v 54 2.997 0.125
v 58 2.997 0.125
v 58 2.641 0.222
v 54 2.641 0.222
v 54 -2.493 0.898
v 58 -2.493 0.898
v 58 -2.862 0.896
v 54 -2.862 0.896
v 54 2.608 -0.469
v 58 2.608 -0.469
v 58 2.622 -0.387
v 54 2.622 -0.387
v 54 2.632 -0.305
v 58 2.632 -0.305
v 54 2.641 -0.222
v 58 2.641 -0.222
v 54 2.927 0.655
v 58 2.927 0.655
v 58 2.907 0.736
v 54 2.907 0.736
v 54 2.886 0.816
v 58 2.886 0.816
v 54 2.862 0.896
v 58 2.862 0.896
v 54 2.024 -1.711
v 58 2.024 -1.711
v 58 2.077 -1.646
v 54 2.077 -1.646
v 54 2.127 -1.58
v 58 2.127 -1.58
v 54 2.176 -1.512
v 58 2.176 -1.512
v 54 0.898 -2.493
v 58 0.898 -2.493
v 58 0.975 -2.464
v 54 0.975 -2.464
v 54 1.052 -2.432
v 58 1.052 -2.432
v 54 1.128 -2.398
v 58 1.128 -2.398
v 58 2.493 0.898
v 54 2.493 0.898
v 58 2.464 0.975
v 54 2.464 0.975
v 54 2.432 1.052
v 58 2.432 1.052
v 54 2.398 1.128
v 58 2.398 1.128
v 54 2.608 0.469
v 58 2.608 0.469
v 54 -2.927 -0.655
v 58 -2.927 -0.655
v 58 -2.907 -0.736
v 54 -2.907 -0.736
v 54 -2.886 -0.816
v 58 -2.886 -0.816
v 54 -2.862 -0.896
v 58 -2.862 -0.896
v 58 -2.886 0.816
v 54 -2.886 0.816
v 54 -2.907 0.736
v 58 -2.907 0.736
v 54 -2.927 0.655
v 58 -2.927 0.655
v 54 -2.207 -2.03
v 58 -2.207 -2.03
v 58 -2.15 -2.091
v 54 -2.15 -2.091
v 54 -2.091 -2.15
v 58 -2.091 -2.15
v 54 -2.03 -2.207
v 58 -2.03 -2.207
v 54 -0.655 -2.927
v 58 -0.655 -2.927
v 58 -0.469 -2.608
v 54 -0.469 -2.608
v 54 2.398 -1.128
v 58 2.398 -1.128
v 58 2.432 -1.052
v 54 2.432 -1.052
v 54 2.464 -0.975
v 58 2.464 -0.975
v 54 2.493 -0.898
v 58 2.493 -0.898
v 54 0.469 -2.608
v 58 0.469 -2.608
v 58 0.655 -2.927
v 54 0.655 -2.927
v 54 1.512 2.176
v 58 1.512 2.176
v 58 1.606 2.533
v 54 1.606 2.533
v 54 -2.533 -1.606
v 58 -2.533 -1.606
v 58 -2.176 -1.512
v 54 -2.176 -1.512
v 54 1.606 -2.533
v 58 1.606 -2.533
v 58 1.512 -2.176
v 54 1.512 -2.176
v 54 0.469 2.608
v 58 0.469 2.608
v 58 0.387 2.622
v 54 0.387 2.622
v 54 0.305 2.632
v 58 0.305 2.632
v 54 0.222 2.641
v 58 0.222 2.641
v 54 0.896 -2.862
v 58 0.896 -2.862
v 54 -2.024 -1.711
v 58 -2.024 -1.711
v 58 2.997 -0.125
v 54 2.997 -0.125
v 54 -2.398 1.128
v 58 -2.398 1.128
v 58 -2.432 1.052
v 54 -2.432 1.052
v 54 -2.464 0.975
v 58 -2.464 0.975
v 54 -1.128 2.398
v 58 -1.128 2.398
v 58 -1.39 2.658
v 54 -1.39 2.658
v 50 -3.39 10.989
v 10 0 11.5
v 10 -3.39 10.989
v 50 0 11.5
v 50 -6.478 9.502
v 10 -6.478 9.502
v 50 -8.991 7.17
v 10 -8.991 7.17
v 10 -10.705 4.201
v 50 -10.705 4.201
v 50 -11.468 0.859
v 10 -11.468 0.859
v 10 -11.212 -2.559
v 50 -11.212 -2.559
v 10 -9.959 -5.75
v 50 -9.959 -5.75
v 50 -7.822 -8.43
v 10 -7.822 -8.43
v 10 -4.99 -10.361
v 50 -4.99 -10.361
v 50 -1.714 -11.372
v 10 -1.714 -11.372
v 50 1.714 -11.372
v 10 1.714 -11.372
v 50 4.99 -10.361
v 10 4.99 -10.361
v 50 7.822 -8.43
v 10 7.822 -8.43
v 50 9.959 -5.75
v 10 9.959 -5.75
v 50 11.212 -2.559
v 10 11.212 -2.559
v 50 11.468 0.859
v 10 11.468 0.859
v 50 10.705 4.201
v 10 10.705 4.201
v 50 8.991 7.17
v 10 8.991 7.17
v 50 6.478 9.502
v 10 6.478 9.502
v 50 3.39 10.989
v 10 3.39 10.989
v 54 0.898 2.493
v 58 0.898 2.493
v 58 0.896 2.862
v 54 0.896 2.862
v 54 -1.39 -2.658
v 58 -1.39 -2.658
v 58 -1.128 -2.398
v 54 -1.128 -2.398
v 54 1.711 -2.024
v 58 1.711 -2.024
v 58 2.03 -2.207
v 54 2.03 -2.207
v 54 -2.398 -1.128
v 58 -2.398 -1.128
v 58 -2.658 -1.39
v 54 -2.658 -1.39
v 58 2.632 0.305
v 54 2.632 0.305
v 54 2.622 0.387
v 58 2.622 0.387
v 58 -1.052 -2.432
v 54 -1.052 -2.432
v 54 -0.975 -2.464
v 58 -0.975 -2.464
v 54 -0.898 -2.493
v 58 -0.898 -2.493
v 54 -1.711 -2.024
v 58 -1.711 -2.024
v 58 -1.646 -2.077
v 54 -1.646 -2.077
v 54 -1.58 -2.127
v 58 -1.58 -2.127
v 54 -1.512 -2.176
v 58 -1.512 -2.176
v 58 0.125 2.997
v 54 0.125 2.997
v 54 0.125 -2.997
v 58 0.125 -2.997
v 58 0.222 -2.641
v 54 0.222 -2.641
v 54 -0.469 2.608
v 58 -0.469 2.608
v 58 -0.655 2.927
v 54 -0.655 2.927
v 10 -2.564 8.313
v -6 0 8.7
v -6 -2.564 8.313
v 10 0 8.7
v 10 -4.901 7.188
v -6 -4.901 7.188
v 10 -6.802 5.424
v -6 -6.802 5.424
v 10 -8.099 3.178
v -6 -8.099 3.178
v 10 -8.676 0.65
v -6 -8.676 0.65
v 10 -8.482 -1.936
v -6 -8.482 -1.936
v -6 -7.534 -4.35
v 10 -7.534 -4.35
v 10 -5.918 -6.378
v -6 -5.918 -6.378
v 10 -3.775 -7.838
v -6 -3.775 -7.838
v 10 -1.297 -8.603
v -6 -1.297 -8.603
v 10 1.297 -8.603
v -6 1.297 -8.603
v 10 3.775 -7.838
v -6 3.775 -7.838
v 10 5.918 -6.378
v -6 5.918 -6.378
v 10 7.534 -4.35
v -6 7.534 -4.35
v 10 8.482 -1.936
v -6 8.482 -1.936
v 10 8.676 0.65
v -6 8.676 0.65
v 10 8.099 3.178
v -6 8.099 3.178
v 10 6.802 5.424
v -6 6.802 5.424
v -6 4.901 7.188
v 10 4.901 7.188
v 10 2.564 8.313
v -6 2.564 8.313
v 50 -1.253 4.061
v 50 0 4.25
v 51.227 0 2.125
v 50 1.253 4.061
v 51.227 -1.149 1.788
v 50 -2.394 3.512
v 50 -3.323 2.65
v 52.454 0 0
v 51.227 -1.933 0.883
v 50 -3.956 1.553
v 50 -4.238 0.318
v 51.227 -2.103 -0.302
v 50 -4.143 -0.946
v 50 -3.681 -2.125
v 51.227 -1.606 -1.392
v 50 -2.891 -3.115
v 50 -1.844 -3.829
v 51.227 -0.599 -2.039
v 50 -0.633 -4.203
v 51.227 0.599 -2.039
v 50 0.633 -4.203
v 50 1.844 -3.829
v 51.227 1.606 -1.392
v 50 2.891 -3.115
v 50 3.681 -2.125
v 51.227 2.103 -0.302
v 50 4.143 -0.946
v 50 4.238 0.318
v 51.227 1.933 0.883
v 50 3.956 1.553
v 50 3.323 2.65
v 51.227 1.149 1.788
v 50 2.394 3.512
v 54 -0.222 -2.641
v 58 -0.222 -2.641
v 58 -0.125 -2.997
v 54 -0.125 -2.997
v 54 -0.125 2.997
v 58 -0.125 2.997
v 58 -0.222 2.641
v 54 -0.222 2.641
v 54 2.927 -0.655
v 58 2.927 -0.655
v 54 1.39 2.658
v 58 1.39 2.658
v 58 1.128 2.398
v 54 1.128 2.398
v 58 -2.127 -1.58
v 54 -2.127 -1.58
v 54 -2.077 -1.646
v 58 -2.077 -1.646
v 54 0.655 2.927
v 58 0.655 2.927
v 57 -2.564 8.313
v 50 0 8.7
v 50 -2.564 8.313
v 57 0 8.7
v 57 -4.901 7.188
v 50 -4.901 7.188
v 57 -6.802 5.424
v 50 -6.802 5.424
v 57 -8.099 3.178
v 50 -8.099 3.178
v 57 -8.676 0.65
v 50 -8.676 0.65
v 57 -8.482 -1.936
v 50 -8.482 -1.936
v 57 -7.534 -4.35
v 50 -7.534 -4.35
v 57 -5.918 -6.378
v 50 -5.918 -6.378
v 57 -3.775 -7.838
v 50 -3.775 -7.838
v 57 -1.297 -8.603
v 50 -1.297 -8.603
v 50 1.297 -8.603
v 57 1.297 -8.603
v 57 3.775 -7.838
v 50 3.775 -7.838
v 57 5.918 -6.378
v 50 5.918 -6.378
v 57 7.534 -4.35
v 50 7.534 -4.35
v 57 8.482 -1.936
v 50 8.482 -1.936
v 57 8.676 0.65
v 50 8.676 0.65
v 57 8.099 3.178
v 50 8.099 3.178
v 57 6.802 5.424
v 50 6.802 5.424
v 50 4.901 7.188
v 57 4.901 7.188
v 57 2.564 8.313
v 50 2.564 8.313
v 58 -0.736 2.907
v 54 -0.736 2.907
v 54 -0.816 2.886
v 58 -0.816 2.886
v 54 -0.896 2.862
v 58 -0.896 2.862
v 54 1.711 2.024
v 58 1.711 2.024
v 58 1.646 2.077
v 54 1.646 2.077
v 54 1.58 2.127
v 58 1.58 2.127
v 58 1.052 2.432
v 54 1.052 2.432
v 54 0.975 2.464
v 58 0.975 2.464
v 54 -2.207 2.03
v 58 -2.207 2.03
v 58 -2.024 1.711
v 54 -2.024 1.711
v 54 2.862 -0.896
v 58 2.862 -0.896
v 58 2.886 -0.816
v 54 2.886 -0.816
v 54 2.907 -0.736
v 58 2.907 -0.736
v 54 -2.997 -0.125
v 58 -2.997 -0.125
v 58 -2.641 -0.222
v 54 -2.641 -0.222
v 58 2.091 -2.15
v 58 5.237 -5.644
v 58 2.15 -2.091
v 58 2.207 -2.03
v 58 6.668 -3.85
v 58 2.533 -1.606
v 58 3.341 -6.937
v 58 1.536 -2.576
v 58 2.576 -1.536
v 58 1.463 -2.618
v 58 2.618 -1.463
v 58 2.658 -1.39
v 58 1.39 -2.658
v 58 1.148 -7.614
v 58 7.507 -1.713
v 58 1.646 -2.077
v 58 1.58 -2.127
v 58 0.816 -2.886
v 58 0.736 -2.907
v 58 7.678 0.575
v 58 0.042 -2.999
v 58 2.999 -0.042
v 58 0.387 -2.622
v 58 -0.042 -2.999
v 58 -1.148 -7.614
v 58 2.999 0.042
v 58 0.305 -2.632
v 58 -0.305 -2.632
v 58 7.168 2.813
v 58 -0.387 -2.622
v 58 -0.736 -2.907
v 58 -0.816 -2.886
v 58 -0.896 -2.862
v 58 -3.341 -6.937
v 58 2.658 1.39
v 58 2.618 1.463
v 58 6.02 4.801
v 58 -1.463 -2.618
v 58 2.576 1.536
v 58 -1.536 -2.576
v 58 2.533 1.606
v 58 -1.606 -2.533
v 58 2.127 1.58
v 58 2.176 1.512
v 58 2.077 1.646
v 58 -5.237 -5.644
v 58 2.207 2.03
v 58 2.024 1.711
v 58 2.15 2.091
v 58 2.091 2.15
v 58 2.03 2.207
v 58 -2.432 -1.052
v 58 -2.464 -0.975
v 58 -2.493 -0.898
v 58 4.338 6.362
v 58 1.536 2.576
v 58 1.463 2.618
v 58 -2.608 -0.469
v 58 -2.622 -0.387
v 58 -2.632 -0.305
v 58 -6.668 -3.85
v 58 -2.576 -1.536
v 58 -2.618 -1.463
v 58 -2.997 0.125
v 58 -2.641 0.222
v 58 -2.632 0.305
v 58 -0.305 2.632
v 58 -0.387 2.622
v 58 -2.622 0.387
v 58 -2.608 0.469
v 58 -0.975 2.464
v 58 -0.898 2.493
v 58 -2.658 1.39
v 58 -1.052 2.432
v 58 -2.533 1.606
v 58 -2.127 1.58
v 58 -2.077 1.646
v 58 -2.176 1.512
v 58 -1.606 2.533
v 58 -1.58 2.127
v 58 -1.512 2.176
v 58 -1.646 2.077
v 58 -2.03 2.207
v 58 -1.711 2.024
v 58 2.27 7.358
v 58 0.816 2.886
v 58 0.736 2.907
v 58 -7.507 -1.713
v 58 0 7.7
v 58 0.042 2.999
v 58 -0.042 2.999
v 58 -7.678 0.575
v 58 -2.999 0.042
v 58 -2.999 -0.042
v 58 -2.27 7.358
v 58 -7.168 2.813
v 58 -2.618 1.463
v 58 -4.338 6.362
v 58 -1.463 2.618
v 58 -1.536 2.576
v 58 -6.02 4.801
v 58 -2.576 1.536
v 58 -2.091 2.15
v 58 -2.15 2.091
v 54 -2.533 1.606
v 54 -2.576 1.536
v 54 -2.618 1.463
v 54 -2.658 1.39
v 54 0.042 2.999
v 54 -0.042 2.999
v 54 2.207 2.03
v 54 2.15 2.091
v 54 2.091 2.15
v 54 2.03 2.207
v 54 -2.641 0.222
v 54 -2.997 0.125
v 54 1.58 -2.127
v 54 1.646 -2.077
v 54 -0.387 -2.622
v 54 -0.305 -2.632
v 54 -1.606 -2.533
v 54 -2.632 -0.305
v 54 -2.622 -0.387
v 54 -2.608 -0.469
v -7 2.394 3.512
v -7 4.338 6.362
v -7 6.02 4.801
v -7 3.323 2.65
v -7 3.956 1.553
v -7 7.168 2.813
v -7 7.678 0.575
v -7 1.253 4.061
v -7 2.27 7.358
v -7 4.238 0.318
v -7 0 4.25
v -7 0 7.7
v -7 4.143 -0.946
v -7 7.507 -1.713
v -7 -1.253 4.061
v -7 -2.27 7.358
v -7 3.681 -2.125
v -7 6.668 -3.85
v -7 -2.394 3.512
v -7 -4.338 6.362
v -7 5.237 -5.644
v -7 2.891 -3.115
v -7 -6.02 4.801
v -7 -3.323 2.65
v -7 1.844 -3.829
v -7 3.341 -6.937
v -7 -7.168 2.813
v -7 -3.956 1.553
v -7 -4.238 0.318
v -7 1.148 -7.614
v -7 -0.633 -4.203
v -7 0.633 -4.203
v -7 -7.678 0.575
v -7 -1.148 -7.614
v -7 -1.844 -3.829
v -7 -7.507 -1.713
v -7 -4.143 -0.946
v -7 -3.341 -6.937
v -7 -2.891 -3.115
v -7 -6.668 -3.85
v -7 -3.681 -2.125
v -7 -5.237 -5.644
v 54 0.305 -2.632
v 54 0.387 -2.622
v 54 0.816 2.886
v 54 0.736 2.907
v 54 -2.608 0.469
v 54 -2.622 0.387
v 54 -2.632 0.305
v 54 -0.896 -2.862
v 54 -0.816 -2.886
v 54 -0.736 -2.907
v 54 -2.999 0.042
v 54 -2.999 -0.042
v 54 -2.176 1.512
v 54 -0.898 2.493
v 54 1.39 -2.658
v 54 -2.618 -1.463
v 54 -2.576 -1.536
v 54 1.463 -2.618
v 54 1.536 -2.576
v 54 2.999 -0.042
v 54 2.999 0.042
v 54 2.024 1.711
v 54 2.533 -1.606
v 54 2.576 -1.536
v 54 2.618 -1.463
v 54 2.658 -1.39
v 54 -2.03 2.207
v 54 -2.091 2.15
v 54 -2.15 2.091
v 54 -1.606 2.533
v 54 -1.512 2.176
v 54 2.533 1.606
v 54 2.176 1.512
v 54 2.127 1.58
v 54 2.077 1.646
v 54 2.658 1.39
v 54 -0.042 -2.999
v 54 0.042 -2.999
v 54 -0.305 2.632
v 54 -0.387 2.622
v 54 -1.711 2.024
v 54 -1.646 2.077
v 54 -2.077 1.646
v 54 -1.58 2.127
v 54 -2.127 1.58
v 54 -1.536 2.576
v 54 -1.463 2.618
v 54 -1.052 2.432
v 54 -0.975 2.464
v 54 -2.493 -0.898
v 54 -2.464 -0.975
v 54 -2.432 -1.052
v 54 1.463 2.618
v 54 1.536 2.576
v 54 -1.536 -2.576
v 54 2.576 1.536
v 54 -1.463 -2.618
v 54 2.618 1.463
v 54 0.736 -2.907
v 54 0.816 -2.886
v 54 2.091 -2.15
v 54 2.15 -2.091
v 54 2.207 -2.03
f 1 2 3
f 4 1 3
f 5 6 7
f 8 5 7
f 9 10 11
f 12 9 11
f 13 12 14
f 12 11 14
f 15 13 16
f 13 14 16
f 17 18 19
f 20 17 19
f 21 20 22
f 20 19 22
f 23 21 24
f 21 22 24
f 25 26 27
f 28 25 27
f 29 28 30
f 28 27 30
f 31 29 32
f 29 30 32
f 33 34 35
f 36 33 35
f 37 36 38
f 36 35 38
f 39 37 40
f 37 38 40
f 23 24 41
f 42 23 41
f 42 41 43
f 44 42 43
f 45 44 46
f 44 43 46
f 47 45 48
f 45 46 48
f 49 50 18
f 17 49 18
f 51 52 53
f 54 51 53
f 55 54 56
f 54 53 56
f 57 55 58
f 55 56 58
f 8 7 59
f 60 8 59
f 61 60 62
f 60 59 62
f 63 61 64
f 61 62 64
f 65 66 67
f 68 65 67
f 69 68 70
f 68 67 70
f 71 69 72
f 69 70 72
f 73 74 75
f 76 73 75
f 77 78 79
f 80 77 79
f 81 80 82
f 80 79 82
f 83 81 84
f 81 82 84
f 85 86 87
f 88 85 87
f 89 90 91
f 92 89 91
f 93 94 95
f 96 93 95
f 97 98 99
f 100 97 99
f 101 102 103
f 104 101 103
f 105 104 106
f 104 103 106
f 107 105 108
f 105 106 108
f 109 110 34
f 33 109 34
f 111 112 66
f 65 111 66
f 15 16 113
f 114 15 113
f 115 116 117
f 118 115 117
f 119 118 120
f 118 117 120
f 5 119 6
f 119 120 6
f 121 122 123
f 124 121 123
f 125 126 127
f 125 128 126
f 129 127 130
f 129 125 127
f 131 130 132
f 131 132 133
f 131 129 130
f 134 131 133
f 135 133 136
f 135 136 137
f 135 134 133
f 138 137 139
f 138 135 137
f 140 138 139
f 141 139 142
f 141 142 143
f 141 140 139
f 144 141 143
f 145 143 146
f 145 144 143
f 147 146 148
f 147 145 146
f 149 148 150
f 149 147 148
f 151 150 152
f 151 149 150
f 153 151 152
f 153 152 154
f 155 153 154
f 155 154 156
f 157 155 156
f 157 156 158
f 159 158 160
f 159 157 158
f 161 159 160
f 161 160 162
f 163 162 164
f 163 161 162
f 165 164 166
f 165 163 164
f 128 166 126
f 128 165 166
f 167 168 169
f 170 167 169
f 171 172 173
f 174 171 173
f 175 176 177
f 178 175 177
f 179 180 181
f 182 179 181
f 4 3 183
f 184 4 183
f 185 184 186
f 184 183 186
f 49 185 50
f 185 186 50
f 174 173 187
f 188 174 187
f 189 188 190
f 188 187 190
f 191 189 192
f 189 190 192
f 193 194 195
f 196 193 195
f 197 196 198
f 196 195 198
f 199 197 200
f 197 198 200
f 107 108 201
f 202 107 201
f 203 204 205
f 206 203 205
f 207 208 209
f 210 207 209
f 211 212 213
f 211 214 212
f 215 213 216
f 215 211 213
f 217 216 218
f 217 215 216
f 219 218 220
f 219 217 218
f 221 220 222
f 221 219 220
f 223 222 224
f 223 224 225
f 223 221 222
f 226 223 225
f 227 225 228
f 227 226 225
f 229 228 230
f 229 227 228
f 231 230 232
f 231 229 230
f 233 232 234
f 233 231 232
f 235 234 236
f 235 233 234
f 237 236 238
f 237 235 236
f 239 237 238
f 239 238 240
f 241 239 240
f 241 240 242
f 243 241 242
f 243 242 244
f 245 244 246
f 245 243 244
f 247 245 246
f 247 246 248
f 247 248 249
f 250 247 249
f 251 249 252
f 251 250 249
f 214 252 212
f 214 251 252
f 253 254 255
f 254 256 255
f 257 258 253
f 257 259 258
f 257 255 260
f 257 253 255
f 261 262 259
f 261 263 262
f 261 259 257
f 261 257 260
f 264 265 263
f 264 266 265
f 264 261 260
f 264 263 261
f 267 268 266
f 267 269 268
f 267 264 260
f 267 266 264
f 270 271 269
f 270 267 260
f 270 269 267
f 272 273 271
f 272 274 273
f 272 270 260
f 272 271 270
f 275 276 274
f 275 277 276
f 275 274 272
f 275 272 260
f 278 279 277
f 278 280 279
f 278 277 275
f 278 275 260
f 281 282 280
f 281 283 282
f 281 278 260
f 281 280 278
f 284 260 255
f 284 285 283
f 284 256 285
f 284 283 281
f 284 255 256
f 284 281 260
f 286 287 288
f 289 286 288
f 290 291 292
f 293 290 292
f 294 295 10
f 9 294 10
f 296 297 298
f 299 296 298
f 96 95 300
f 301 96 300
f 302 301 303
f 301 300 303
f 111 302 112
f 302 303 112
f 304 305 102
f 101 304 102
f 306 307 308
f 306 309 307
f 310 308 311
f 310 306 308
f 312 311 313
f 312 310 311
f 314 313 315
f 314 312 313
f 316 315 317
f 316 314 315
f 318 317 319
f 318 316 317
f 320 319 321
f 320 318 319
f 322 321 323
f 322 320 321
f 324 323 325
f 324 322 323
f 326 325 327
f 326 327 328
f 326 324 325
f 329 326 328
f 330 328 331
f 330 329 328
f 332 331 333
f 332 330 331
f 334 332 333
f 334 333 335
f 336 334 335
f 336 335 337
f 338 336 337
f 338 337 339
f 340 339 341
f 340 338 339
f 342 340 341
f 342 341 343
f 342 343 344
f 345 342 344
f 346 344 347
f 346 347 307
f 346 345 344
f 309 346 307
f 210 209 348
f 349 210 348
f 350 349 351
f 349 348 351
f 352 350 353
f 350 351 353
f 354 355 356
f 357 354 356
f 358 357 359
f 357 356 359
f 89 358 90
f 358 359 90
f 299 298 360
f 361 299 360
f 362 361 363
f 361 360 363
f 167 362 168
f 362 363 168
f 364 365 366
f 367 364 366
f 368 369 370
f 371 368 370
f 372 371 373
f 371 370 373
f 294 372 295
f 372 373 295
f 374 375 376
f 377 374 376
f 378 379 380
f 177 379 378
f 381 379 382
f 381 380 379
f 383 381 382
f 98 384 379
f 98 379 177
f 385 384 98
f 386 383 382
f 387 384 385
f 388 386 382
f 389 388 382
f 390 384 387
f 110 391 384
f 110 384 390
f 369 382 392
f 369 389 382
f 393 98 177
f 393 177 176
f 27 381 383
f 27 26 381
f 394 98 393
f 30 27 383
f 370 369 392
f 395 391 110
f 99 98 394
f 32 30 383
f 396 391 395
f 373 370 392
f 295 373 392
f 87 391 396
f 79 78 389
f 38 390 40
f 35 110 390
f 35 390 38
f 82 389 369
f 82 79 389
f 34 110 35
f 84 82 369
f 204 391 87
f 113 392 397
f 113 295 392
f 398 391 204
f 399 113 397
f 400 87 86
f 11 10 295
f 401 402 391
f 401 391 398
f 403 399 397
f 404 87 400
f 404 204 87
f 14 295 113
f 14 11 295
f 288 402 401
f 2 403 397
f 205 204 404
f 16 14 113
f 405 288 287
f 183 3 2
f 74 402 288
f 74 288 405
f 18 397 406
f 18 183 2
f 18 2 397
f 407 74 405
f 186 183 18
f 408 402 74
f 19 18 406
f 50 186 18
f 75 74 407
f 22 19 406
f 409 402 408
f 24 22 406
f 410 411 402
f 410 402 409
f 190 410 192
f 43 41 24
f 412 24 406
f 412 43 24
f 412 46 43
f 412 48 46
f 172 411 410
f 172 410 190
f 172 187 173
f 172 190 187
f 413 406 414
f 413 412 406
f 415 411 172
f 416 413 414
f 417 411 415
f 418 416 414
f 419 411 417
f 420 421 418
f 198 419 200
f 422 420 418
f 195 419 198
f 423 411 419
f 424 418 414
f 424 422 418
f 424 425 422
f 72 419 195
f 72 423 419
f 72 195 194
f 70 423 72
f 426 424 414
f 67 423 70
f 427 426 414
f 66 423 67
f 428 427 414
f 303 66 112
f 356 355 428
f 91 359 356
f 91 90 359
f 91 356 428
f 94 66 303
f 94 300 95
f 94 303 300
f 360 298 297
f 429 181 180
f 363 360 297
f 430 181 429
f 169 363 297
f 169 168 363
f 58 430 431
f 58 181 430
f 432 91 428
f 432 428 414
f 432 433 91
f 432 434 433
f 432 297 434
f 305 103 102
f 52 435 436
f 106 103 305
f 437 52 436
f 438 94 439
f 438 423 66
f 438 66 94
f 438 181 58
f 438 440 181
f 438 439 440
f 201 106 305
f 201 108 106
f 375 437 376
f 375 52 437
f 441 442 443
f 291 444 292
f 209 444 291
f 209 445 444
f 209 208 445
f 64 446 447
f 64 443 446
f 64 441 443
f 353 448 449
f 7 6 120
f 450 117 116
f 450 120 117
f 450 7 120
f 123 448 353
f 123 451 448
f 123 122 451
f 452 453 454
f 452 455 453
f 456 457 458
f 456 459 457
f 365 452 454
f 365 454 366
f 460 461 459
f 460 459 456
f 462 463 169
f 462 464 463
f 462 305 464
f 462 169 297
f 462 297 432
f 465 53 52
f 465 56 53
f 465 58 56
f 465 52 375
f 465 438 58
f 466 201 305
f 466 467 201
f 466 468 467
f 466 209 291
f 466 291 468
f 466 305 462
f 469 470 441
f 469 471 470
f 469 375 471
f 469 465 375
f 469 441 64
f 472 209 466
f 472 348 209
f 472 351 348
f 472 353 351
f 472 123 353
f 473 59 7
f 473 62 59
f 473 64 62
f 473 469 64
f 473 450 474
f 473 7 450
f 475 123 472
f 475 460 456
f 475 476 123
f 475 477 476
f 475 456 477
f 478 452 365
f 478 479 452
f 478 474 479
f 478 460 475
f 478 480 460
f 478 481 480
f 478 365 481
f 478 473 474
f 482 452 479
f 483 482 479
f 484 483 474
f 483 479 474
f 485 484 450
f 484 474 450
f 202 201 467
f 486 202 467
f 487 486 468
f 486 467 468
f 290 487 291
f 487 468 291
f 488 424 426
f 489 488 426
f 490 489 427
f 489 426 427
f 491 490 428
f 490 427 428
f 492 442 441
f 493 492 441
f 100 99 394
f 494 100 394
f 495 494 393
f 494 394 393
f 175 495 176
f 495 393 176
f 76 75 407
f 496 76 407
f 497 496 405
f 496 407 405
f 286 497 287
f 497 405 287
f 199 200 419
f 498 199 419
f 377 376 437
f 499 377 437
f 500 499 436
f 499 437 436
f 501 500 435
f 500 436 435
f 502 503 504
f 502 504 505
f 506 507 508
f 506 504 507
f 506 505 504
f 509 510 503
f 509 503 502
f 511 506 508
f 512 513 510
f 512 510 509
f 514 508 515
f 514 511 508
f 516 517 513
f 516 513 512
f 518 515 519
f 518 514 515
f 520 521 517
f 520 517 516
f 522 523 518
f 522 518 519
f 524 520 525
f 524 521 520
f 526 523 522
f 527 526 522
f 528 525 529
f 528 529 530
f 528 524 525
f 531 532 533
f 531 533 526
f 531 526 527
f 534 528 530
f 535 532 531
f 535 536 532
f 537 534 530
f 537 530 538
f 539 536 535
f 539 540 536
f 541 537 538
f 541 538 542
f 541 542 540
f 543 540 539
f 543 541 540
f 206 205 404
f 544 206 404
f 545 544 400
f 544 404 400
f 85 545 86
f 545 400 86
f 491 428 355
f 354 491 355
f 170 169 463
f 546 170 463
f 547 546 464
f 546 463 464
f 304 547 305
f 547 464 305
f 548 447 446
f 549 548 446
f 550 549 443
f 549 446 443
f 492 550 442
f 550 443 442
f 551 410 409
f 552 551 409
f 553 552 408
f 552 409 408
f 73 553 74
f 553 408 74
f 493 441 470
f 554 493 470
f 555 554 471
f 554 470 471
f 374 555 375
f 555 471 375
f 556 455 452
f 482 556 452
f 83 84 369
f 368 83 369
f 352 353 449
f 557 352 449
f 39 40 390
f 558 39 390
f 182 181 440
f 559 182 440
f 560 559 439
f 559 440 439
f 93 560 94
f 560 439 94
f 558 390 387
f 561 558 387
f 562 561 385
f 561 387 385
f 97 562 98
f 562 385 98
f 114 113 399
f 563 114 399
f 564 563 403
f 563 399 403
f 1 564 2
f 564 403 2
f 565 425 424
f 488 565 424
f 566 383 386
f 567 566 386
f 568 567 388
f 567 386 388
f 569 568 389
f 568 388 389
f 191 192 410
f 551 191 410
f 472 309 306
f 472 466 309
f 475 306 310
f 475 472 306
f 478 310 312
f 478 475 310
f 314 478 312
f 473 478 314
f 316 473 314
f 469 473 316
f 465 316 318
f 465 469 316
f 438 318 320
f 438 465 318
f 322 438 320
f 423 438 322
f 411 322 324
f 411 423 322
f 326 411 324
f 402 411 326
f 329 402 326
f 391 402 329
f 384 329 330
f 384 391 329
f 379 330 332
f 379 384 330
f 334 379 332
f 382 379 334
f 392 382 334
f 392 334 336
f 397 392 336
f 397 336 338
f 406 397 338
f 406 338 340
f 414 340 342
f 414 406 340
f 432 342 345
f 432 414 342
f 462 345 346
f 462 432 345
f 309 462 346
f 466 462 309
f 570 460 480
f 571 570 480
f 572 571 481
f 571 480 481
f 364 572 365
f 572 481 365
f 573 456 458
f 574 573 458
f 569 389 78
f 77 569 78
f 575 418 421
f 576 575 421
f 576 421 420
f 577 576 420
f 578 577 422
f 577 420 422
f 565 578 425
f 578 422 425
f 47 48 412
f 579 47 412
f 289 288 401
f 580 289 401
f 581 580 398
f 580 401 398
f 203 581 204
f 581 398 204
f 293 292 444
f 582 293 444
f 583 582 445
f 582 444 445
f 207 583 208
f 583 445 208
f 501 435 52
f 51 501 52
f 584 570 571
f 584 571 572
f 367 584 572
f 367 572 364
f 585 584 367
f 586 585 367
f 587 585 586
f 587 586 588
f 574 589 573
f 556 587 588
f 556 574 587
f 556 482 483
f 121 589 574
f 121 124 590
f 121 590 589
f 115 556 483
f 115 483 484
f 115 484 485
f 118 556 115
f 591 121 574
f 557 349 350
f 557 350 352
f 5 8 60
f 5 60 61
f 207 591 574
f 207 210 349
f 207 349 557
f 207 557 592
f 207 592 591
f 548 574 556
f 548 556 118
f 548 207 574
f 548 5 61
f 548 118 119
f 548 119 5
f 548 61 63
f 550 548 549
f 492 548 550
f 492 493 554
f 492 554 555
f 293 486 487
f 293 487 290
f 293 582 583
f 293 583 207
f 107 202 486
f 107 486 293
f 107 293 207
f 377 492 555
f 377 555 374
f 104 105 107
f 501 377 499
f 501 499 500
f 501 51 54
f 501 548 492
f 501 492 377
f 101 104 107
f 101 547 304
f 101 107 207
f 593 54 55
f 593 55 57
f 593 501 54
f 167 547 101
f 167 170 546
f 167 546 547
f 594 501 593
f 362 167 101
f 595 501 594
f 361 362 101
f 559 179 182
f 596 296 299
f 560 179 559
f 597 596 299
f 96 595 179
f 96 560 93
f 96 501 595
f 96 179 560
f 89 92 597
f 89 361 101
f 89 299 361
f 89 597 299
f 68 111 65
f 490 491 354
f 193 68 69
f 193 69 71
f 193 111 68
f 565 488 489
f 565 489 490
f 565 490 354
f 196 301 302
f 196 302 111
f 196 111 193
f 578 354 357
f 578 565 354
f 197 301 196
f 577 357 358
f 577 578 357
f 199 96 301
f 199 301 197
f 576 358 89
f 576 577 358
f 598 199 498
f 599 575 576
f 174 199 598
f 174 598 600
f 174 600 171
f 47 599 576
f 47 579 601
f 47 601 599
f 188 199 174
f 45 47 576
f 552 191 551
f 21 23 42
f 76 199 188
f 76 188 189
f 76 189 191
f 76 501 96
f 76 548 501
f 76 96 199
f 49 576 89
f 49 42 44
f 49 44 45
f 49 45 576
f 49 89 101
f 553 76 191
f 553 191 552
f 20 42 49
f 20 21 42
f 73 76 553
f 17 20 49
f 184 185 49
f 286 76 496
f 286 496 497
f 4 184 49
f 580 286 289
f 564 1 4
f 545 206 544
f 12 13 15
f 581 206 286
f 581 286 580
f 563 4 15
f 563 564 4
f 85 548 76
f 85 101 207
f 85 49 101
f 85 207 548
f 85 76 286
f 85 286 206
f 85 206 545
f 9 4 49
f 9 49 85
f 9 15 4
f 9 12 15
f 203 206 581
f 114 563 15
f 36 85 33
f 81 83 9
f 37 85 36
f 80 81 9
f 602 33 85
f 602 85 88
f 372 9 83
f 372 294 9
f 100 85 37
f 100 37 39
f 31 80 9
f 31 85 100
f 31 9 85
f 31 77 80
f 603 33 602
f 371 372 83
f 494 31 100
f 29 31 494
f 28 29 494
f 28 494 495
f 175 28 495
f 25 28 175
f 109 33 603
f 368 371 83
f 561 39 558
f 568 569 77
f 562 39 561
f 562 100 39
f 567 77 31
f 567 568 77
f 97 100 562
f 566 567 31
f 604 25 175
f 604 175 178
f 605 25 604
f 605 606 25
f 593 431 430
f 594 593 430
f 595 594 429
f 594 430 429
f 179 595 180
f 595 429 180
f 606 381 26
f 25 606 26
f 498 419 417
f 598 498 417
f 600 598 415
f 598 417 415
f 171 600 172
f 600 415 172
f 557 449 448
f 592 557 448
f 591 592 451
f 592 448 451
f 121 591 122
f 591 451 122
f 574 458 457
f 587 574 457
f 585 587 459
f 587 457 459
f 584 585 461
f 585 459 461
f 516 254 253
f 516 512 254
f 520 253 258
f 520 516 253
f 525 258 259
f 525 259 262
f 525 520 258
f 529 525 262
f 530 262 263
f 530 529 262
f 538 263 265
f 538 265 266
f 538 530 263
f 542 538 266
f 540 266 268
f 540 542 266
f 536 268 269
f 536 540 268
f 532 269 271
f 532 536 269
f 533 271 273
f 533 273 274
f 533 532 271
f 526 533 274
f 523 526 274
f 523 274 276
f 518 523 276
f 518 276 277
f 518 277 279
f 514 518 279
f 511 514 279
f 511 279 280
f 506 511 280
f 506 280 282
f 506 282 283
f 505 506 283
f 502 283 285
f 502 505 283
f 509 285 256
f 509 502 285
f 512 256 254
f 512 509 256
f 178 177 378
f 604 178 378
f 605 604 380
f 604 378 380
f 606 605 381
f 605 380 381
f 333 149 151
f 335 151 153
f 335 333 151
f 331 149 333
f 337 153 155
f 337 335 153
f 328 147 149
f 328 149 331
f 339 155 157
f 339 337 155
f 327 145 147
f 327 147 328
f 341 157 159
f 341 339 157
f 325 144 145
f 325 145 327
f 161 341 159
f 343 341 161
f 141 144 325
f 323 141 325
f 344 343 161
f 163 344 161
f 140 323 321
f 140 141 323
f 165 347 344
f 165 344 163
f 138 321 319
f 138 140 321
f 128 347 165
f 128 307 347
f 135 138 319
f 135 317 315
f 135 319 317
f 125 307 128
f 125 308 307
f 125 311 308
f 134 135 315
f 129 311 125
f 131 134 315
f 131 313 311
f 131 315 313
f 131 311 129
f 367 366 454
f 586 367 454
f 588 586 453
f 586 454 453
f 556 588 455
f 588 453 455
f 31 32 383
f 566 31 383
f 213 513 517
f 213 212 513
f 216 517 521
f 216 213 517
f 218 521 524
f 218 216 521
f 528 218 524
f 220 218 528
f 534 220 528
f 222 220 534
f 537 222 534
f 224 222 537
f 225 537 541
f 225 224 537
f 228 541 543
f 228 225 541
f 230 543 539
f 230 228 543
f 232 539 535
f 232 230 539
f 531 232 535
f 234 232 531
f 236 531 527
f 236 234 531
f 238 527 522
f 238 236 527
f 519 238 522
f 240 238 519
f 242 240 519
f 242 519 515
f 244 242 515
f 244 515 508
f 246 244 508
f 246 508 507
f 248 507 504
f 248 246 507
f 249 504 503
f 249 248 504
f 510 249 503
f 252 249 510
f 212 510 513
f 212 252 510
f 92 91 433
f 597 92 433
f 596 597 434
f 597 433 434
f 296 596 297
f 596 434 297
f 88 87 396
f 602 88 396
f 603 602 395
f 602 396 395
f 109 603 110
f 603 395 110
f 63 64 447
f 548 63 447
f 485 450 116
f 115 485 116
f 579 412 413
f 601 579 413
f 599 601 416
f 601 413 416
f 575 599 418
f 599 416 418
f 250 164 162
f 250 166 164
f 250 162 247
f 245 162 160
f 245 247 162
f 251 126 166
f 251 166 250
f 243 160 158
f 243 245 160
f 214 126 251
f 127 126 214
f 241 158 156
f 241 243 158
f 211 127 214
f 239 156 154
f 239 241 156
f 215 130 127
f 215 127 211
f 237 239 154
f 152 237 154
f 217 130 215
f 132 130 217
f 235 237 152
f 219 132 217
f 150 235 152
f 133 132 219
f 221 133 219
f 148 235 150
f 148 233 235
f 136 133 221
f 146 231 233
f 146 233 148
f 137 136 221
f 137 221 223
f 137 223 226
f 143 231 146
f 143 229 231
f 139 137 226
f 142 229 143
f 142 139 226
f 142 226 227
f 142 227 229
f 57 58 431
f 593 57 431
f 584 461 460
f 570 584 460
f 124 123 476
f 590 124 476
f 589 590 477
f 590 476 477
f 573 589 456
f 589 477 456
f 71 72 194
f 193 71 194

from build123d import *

# Parameters (mm, degrees)
CUT_EXTRUDE_1_DEPTH = 4


with BuildPart() as part:
    # Эскиз3 → Повернуть1 (revolve)
    with BuildSketch(Plane.XY, mode=Mode.PRIVATE) as revolve_1_sk:
        Polygon((-7, 4.25), (-7, 7.7), (-6, 8.7), (10, 8.7), (10, 11.5), (50, 11.5), (50, 8.7), (57, 8.7), (58, 7.7), (58, 0), (52.453738644, 0), (50, 4.25), align=None)
    revolve(revolve_1_sk.sketch.rotate(Axis((-6.877569373, 0, 0), (1, 0, 0)), 90), axis=Axis((-6.877569373, 0, 0), (1, 0, 0)))

    # Эскиз4 → Вырез-Вытянуть1 (cut)
    with BuildSketch(Plane(origin=(58, 0, -31), x_dir=(0, 0, 1), z_dir=(-1, 0, 0))):
        with BuildLine():
            Line((30.778386531, 2.640717227), (30.875027145, 2.996524002))
            ThreePointArc((30.875027145, 2.996524002), (31, 2.999128925), (31.124972855, 2.996524002))
            Line((31.124972855, 2.996524002), (31.221613469, 2.640717227))
            ThreePointArc((31.221613469, 2.640717227), (31.345894409, 2.627328883), (31.469405738, 2.608094755))
            Line((31.469405738, 2.608094755), (31.654842973, 2.926765277))
            ThreePointArc((31.654842973, 2.926765277), (31.776231684, 2.896936085), (31.896271989, 2.862074568))
            Line((31.896271989, 2.862074568), (31.897530084, 2.493379183))
            ThreePointArc((31.897530084, 2.493379183), (32.014111096, 2.448280761), (32.12843572, 2.397734937))
            Line((32.12843572, 2.397734937), (32.390032334, 2.657552336))
            ThreePointArc((32.390032334, 2.657552336), (32.499564462, 2.597321838), (32.606491668, 2.532579481))
            Line((32.606491668, 2.532579481), (32.512281507, 2.176121468))
            ThreePointArc((32.512281507, 2.176121468), (32.613217787, 2.102386352), (32.710564672, 2.023973445))
            Line((32.710564672, 2.023973445), (33.030493289, 2.207231595))
            ThreePointArc((33.030493289, 2.207231595), (33.1207044, 2.1207044), (33.207231595, 2.030493289))
            Line((33.207231595, 2.030493289), (33.023973445, 1.710564672))
            ThreePointArc((33.023973445, 1.710564672), (33.102386352, 1.613217787), (33.176121468, 1.512281507))
            Line((33.176121468, 1.512281507), (33.532579481, 1.606491668))
            ThreePointArc((33.532579481, 1.606491668), (33.597321838, 1.499564462), (33.657552336, 1.390032334))
            Line((33.657552336, 1.390032334), (33.397734937, 1.12843572))
            ThreePointArc((33.397734937, 1.12843572), (33.448280761, 1.014111096), (33.493379183, 0.897530084))
            Line((33.493379183, 0.897530084), (33.862074568, 0.896271989))
            ThreePointArc((33.862074568, 0.896271989), (33.896936085, 0.776231684), (33.926765277, 0.654842973))
            Line((33.926765277, 0.654842973), (33.608094755, 0.469405738))
            ThreePointArc((33.608094755, 0.469405738), (33.627328883, 0.345894409), (33.640717227, 0.221613469))
            Line((33.640717227, 0.221613469), (33.996524002, 0.124972855))
            ThreePointArc((33.996524002, 0.124972855), (33.999128925, 0), (33.996524002, -0.124972855))
            Line((33.996524002, -0.124972855), (33.640717227, -0.221613469))
            ThreePointArc((33.640717227, -0.221613469), (33.627328883, -0.345894409), (33.608094755, -0.469405738))
            Line((33.608094755, -0.469405738), (33.926765277, -0.654842973))
            ThreePointArc((33.926765277, -0.654842973), (33.896936085, -0.776231684), (33.862074568, -0.896271989))
            Line((33.862074568, -0.896271989), (33.493379183, -0.897530084))
            ThreePointArc((33.493379183, -0.897530084), (33.448280761, -1.014111096), (33.397734937, -1.12843572))
            Line((33.397734937, -1.12843572), (33.657552336, -1.390032334))
            ThreePointArc((33.657552336, -1.390032334), (33.597321838, -1.499564462), (33.532579481, -1.606491668))
            Line((33.532579481, -1.606491668), (33.176121468, -1.512281507))
            ThreePointArc((33.176121468, -1.512281507), (33.102386352, -1.613217787), (33.023973445, -1.710564672))
            Line((33.023973445, -1.710564672), (33.207231595, -2.030493289))
            ThreePointArc((33.207231595, -2.030493289), (33.1207044, -2.1207044), (33.030493289, -2.207231595))
            Line((33.030493289, -2.207231595), (32.710564672, -2.023973445))
            ThreePointArc((32.710564672, -2.023973445), (32.613217787, -2.102386352), (32.512281507, -2.176121468))
            Line((32.512281507, -2.176121468), (32.606491668, -2.532579481))
            ThreePointArc((32.606491668, -2.532579481), (32.499564462, -2.597321838), (32.390032334, -2.657552336))
            Line((32.390032334, -2.657552336), (32.12843572, -2.397734937))
            ThreePointArc((32.12843572, -2.397734937), (32.014111096, -2.448280761), (31.897530084, -2.493379183))
            Line((31.897530084, -2.493379183), (31.896271989, -2.862074568))
            ThreePointArc((31.896271989, -2.862074568), (31.776231684, -2.896936085), (31.654842973, -2.926765277))
            Line((31.654842973, -2.926765277), (31.469405738, -2.608094755))
            ThreePointArc((31.469405738, -2.608094755), (31.345894409, -2.627328883), (31.221613469, -2.640717227))
            Line((31.221613469, -2.640717227), (31.124972855, -2.996524002))
            ThreePointArc((31.124972855, -2.996524002), (31, -2.999128925), (30.875027145, -2.996524002))
            Line((30.875027145, -2.996524002), (30.778386531, -2.640717227))
            ThreePointArc((30.778386531, -2.640717227), (30.654105591, -2.627328883), (30.530594262, -2.608094755))
            Line((30.530594262, -2.608094755), (30.345157027, -2.926765277))
            ThreePointArc((30.345157027, -2.926765277), (30.223768316, -2.896936085), (30.103728011, -2.862074568))
            Line((30.103728011, -2.862074568), (30.102469916, -2.493379183))
            ThreePointArc((30.102469916, -2.493379183), (29.985888904, -2.448280761), (29.87156428, -2.397734937))
            Line((29.87156428, -2.397734937), (29.609967666, -2.657552336))
            ThreePointArc((29.609967666, -2.657552336), (29.500435538, -2.597321838), (29.393508332, -2.532579481))
            Line((29.393508332, -2.532579481), (29.487718493, -2.176121468))
            ThreePointArc((29.487718493, -2.176121468), (29.386782213, -2.102386352), (29.289435328, -2.023973445))
            Line((29.289435328, -2.023973445), (28.969506711, -2.207231595))
            ThreePointArc((28.969506711, -2.207231595), (28.8792956, -2.1207044), (28.792768405, -2.030493289))
            Line((28.792768405, -2.030493289), (28.976026555, -1.710564672))
            ThreePointArc((28.976026555, -1.710564672), (28.897613648, -1.613217787), (28.823878532, -1.512281507))
            Line((28.823878532, -1.512281507), (28.467420519, -1.606491668))
            ThreePointArc((28.467420519, -1.606491668), (28.402678162, -1.499564462), (28.342447664, -1.390032334))
            Line((28.342447664, -1.390032334), (28.602265063, -1.12843572))
            ThreePointArc((28.602265063, -1.12843572), (28.551719239, -1.014111096), (28.506620817, -0.897530084))
            Line((28.506620817, -0.897530084), (28.137925432, -0.896271989))
            ThreePointArc((28.137925432, -0.896271989), (28.103063915, -0.776231684), (28.073234723, -0.654842973))
            Line((28.073234723, -0.654842973), (28.391905245, -0.469405738))
            ThreePointArc((28.391905245, -0.469405738), (28.372671117, -0.345894409), (28.359282773, -0.221613469))
            Line((28.359282773, -0.221613469), (28.003475998, -0.124972855))
            ThreePointArc((28.003475998, -0.124972855), (28.000871075, 0), (28.003475998, 0.124972855))
            Line((28.003475998, 0.124972855), (28.359282773, 0.221613469))
            ThreePointArc((28.359282773, 0.221613469), (28.372671117, 0.345894409), (28.391905245, 0.469405738))
            Line((28.391905245, 0.469405738), (28.073234723, 0.654842973))
            ThreePointArc((28.073234723, 0.654842973), (28.103063915, 0.776231684), (28.137925432, 0.896271989))
            Line((28.137925432, 0.896271989), (28.506620817, 0.897530084))
            ThreePointArc((28.506620817, 0.897530084), (28.551719239, 1.014111096), (28.602265063, 1.12843572))
            Line((28.602265063, 1.12843572), (28.342447664, 1.390032334))
            ThreePointArc((28.342447664, 1.390032334), (28.402678162, 1.499564462), (28.467420519, 1.606491668))
            Line((28.467420519, 1.606491668), (28.823878532, 1.512281507))
            ThreePointArc((28.823878532, 1.512281507), (28.897613648, 1.613217787), (28.976026555, 1.710564672))
            Line((28.976026555, 1.710564672), (28.792768405, 2.030493289))
            ThreePointArc((28.792768405, 2.030493289), (28.8792956, 2.1207044), (28.969506711, 2.207231595))
            Line((28.969506711, 2.207231595), (29.289435328, 2.023973445))
            ThreePointArc((29.289435328, 2.023973445), (29.386782213, 2.102386352), (29.487718493, 2.176121468))
            Line((29.487718493, 2.176121468), (29.393508332, 2.532579481))
            ThreePointArc((29.393508332, 2.532579481), (29.500435538, 2.597321838), (29.609967666, 2.657552336))
            Line((29.609967666, 2.657552336), (29.87156428, 2.397734937))
            ThreePointArc((29.87156428, 2.397734937), (29.985888904, 2.448280761), (30.102469916, 2.493379183))
            Line((30.102469916, 2.493379183), (30.103728011, 2.862074568))
            ThreePointArc((30.103728011, 2.862074568), (30.223768316, 2.896936085), (30.345157027, 2.926765277))
            Line((30.345157027, 2.926765277), (30.530594262, 2.608094755))
            ThreePointArc((30.530594262, 2.608094755), (30.654105591, 2.627328883), (30.778386531, 2.640717227))
        make_face()
    extrude(amount=CUT_EXTRUDE_1_DEPTH, mode=Mode.SUBTRACT)


solid = part.part
